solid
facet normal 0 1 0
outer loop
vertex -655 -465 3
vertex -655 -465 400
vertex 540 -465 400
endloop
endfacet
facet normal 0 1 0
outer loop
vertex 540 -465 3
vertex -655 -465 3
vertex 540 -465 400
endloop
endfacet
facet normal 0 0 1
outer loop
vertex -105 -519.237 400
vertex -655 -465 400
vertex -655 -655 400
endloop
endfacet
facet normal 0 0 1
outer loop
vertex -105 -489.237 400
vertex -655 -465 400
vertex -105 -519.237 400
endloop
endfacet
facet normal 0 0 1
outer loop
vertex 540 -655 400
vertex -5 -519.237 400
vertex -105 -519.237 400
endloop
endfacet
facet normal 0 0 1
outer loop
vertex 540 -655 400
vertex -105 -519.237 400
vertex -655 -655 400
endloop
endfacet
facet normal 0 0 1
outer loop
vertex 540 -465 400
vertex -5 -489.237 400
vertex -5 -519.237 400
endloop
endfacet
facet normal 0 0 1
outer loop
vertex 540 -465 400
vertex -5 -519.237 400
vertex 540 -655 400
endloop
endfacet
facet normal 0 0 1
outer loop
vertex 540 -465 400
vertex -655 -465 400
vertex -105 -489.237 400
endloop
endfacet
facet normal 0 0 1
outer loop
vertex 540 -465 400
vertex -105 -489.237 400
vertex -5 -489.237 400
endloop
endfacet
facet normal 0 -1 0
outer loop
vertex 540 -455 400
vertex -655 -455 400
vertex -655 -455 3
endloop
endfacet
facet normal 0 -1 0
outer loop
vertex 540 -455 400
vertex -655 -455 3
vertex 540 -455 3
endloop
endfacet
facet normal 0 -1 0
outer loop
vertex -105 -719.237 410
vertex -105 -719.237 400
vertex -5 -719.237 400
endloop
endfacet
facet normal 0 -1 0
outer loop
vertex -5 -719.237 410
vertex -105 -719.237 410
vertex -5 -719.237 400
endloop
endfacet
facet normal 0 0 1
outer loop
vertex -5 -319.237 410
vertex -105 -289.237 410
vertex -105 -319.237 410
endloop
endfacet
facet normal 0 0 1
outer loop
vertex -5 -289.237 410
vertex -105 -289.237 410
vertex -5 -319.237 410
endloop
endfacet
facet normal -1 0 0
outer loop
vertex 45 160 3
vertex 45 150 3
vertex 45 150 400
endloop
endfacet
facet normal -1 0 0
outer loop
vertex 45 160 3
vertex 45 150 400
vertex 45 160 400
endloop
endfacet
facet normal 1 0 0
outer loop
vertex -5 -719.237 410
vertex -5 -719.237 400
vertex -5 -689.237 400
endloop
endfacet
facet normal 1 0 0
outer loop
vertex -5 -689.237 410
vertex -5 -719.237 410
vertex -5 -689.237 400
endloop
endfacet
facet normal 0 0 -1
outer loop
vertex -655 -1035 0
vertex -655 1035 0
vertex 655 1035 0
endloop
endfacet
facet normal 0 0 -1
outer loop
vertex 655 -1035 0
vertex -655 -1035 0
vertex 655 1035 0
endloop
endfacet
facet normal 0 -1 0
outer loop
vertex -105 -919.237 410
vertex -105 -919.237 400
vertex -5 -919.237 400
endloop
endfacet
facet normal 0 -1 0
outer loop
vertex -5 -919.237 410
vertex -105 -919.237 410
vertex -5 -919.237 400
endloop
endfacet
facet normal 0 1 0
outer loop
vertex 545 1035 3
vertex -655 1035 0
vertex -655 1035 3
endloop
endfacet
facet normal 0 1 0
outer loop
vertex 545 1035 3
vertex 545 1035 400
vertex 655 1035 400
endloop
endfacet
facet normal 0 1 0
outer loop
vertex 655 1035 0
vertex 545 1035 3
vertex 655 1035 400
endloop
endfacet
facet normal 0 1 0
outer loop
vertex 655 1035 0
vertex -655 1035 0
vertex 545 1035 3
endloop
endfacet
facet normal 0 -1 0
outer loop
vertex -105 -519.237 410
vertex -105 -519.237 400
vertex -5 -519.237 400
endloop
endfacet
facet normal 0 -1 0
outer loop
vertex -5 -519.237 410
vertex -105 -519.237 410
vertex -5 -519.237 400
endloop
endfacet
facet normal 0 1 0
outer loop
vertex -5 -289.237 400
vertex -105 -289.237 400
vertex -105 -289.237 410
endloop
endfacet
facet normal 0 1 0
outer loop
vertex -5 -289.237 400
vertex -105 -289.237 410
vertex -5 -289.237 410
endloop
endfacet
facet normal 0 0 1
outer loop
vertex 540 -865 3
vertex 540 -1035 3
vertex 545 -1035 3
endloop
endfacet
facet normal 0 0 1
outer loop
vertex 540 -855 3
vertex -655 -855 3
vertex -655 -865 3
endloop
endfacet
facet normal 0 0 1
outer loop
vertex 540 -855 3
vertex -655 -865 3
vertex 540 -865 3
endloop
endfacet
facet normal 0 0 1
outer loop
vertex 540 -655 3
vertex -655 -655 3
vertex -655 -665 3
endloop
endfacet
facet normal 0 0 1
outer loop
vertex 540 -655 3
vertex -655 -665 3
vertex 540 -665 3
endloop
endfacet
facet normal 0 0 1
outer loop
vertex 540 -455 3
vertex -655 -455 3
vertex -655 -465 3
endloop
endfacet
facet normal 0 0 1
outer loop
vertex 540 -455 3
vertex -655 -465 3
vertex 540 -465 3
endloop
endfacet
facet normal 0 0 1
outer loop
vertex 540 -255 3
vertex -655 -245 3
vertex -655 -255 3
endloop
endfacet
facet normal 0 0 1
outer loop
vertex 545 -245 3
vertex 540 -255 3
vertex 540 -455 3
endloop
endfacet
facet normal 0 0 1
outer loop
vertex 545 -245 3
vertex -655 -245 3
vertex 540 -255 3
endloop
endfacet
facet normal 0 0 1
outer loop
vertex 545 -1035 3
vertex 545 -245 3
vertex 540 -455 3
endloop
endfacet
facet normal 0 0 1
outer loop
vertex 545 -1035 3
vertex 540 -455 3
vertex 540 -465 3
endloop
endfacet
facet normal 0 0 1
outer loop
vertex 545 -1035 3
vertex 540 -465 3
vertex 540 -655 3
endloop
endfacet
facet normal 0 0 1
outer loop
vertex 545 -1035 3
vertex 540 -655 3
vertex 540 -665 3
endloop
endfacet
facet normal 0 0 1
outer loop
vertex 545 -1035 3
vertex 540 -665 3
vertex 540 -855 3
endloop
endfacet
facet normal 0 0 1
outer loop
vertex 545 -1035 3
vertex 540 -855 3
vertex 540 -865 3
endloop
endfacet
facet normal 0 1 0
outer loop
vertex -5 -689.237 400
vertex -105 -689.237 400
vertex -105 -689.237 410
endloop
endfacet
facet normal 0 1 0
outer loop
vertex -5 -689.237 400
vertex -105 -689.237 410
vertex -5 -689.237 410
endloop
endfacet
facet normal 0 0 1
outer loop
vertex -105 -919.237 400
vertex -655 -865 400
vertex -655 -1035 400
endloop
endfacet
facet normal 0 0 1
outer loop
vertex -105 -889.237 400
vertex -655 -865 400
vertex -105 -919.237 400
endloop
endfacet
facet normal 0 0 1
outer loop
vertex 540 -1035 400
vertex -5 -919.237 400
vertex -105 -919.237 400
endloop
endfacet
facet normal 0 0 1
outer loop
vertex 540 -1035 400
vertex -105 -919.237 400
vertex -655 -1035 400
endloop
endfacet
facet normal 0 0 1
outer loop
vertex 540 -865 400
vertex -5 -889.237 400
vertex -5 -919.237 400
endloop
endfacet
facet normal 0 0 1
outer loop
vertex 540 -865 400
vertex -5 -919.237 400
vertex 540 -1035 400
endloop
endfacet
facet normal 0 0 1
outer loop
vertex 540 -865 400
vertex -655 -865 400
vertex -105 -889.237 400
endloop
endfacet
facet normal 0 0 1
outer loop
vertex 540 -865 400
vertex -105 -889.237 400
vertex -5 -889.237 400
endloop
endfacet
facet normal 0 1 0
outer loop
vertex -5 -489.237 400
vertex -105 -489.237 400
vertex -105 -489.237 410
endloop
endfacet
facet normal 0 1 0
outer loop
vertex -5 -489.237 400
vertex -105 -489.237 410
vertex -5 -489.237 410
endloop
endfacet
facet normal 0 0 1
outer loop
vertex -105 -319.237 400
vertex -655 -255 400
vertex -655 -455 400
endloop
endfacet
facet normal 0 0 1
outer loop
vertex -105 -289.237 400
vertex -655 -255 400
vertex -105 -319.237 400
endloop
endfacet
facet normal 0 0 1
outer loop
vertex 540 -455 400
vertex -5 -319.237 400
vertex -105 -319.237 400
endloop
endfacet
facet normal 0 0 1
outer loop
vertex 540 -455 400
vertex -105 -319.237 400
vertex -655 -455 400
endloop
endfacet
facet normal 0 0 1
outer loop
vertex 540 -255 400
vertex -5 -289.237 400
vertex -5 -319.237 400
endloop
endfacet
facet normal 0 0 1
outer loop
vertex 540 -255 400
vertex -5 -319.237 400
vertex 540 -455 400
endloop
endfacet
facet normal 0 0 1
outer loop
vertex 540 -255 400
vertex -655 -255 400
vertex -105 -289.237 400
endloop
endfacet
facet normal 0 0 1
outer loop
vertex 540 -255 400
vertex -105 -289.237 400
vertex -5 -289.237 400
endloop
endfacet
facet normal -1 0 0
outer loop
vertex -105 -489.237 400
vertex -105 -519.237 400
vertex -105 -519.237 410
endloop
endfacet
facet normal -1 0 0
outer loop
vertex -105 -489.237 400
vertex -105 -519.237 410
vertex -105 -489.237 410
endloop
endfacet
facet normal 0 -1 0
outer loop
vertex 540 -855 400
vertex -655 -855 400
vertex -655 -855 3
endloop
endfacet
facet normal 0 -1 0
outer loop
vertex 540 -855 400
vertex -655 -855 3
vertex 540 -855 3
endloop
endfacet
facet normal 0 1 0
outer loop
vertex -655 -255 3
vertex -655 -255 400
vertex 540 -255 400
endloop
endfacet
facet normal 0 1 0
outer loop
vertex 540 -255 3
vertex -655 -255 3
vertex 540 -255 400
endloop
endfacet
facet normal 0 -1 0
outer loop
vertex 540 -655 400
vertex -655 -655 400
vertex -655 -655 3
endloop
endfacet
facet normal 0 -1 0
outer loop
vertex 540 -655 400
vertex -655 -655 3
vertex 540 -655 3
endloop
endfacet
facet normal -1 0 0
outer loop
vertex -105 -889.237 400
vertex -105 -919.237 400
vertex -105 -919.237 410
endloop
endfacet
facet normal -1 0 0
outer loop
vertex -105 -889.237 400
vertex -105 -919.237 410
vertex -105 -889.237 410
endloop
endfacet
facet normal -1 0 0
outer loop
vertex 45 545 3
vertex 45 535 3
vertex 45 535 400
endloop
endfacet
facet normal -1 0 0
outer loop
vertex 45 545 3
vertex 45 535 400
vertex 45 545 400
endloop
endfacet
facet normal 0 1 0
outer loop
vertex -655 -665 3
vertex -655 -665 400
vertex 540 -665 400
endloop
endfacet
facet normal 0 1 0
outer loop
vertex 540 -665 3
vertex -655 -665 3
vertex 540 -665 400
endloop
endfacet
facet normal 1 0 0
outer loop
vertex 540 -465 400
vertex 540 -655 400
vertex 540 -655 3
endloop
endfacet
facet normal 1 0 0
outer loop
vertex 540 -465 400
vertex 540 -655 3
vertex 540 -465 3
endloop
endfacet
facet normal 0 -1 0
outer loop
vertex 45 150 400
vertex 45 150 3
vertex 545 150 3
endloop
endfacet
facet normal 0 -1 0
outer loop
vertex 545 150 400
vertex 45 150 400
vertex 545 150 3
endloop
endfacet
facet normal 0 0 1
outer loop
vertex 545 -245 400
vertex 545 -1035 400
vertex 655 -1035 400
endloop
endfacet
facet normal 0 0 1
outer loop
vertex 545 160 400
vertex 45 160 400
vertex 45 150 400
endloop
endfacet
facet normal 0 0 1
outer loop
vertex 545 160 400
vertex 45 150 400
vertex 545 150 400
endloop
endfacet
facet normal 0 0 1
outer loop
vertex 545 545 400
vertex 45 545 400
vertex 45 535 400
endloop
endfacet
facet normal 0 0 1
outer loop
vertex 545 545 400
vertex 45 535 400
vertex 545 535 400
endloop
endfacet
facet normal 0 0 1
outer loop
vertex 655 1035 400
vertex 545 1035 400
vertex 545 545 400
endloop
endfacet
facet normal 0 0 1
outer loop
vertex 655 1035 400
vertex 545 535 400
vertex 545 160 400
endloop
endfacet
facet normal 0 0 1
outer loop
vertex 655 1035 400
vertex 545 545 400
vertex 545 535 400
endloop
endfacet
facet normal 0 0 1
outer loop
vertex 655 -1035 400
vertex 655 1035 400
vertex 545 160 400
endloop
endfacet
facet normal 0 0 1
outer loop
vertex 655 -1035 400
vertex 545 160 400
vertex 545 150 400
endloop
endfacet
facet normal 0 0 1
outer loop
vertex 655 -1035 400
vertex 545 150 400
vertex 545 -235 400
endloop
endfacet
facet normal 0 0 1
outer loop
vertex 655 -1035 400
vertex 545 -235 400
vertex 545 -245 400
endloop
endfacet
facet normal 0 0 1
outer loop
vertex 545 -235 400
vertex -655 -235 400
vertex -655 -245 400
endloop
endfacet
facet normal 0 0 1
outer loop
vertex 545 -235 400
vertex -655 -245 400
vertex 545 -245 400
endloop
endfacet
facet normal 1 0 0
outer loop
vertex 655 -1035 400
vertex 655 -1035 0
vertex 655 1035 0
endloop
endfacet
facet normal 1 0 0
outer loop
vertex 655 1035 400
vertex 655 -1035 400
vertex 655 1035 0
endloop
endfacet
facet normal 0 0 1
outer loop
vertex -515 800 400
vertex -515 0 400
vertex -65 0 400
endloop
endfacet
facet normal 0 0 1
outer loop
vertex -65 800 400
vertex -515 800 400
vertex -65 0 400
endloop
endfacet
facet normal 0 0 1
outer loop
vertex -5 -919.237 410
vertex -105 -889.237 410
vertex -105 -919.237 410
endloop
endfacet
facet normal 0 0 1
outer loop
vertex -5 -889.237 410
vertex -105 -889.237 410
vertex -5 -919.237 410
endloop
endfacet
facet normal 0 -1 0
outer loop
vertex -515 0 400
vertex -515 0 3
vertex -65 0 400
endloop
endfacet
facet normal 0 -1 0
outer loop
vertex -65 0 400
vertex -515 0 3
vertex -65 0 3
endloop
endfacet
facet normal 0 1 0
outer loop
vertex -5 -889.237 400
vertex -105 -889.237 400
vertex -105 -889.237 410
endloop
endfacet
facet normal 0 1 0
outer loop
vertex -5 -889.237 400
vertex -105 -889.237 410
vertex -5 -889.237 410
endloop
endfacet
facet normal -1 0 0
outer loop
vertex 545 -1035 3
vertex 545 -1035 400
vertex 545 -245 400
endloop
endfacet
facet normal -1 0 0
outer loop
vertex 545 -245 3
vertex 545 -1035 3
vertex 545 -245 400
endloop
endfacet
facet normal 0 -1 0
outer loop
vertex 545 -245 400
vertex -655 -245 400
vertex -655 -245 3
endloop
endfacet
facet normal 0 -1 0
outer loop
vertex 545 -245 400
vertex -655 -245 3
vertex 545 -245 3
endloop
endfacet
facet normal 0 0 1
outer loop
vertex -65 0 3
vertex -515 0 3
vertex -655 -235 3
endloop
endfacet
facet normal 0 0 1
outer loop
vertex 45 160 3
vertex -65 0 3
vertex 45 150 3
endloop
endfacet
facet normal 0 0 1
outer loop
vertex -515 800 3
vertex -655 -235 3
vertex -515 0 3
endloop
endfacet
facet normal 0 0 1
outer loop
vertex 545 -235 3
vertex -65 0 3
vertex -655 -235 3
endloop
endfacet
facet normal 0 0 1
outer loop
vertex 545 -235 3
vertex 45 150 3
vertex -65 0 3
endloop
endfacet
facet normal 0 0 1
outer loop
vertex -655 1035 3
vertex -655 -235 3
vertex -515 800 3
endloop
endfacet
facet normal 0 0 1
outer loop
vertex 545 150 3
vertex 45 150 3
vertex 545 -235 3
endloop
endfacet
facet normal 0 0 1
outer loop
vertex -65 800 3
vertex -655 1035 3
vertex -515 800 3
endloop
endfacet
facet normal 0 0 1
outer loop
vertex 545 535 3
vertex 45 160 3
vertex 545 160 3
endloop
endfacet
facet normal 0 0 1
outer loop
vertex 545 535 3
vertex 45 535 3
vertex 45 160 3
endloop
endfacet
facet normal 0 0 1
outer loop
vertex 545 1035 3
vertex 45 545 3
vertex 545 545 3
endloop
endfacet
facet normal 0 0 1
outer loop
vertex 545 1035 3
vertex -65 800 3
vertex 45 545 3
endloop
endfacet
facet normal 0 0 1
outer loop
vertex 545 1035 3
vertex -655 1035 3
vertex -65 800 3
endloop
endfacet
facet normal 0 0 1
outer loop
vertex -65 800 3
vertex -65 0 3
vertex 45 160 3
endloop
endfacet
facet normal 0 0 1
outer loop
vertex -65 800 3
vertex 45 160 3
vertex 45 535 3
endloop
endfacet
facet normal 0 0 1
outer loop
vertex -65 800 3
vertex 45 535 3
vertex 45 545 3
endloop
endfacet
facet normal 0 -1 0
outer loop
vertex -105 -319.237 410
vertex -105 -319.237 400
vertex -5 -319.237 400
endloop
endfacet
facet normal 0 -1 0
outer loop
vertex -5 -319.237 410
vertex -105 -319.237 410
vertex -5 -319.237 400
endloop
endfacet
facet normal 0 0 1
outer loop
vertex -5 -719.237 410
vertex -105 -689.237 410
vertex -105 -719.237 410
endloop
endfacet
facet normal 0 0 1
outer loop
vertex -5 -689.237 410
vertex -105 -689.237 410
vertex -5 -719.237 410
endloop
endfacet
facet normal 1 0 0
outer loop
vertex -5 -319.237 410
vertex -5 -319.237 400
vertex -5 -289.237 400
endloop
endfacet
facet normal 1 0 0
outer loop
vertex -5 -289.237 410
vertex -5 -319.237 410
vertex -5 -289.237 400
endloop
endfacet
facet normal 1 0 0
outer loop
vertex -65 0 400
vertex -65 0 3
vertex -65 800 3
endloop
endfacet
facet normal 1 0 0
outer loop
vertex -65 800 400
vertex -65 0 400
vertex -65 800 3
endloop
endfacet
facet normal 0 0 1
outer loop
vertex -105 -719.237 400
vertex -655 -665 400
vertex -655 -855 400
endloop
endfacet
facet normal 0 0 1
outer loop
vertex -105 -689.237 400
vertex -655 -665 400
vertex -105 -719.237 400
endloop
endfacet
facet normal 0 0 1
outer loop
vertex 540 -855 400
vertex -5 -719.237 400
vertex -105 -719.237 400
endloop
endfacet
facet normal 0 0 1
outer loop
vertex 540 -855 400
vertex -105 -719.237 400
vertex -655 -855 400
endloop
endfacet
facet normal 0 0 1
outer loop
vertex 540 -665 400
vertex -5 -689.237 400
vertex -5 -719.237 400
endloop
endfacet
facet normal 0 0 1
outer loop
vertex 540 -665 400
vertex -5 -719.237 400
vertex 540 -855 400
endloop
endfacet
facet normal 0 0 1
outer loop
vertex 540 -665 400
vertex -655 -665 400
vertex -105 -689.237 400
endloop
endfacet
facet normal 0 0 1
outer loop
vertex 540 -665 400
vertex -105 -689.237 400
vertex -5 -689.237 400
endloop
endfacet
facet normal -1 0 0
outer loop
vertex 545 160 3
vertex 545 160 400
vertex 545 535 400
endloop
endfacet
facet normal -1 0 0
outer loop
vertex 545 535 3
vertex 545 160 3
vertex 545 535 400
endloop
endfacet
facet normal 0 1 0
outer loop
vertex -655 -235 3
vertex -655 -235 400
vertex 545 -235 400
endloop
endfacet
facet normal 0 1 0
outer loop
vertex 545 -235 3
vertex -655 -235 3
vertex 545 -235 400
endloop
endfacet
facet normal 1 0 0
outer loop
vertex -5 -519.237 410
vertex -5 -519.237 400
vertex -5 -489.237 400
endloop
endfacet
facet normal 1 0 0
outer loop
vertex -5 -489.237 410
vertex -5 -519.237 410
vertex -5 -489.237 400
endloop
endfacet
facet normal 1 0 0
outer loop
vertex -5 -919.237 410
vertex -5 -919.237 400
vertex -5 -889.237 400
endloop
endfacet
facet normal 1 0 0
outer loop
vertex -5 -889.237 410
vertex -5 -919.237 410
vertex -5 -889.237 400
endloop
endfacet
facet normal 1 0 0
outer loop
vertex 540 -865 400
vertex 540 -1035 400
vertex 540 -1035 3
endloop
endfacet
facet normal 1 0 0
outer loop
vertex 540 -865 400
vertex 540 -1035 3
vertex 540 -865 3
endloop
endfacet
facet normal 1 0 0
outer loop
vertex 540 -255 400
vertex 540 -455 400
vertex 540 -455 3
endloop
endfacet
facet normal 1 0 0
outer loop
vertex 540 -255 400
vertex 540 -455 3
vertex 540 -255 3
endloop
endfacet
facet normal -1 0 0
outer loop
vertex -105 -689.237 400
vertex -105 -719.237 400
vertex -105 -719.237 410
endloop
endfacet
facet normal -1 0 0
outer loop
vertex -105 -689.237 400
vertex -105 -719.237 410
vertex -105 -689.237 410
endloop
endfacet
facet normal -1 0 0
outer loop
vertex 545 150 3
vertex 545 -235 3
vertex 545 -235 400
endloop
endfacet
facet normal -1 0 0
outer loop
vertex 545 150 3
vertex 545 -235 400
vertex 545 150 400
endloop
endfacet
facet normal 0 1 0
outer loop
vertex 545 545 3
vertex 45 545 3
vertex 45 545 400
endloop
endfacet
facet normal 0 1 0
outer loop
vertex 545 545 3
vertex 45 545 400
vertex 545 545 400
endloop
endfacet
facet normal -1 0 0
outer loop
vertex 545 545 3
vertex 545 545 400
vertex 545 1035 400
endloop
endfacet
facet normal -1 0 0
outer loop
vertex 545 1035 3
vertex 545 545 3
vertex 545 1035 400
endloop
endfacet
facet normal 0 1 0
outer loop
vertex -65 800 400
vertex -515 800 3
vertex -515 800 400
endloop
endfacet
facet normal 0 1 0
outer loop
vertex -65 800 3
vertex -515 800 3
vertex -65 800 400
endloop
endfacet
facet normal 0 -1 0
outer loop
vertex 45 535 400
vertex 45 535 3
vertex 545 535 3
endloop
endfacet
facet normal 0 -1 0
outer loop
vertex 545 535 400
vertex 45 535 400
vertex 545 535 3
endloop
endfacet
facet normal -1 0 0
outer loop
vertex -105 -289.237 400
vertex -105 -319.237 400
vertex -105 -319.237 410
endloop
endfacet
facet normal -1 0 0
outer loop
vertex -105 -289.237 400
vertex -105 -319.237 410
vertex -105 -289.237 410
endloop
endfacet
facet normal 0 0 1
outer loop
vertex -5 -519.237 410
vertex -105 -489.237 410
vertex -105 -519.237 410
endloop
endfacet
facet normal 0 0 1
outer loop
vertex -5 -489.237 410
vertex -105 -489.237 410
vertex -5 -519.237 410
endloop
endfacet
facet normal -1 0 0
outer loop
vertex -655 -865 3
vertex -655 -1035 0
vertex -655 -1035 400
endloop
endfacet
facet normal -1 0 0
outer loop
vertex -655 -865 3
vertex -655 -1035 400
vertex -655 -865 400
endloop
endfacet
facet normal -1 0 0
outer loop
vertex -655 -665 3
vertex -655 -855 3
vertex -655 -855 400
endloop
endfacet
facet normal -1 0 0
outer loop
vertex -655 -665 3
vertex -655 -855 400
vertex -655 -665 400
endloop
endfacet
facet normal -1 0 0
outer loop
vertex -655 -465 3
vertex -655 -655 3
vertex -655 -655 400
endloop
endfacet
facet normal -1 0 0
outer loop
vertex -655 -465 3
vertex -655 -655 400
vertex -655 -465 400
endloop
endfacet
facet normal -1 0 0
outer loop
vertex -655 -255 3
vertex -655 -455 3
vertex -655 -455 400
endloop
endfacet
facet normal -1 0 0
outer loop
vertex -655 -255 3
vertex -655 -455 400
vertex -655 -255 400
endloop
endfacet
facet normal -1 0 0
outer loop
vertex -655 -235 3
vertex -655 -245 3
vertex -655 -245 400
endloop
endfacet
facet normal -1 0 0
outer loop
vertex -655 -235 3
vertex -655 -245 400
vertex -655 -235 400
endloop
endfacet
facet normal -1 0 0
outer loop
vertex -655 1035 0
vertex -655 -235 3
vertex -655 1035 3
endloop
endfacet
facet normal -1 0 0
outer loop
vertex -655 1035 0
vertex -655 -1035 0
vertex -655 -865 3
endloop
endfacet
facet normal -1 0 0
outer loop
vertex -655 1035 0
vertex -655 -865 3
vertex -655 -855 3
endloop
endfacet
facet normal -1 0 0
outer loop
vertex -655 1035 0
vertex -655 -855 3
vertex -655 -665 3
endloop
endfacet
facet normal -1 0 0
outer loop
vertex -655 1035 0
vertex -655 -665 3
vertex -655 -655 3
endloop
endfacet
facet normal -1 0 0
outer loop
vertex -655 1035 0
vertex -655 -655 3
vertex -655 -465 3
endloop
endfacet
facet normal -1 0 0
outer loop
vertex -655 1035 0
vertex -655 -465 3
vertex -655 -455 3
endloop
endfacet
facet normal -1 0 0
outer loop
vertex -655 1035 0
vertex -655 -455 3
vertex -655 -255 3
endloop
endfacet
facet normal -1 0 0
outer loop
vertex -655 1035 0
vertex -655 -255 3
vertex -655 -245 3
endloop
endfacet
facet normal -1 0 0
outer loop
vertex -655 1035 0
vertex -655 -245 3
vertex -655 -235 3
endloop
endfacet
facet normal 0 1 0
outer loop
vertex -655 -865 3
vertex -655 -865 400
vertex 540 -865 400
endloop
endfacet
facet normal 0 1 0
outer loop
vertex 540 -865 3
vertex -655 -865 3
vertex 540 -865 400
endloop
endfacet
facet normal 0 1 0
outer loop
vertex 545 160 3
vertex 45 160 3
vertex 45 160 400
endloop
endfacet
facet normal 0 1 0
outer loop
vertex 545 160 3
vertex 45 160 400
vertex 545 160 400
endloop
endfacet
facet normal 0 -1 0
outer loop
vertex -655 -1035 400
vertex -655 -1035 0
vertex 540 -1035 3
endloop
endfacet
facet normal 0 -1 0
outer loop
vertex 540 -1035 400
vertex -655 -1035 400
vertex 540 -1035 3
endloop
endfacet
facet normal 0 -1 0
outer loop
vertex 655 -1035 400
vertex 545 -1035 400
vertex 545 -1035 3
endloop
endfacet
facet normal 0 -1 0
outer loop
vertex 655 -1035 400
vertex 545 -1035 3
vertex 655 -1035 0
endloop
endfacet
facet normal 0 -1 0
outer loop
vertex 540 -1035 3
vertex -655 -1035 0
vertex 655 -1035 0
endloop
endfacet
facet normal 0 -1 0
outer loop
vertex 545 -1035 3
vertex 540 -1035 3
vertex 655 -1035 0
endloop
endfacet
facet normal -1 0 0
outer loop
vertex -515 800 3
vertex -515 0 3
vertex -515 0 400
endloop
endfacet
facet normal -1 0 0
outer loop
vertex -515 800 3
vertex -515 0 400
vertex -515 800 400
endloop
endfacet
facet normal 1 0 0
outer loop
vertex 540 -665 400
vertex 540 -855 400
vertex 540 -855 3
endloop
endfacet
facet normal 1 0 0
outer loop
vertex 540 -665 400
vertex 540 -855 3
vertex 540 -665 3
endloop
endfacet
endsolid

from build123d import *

# Parameters (mm, degrees)
SKETCH1_W           = 1310
SKETCH1_H           = 2070
BOSS_EXTRUDE1_DEPTH = 400
SKETCH2_W           = 1200
SKETCH2_H           = 400
CUT_EXTRUDE2_DEPTH  = 397
SKETCH5_W           = 1200
SKETCH5_H           = 10
CUT_EXTRUDE5_DEPTH  = 397
SKETCH6_W           = 1200
SKETCH6_H           = 10
CUT_EXTRUDE6_DEPTH  = 397
LPATTERN2_COUNT     = 3
LPATTERN2_PITCH     = 200
SKETCH9_W           = 100
SKETCH9_H           = 30
BOSS_EXTRUDE2_DEPTH = 10
LPATTERN3_COUNT     = 4
LPATTERN3_PITCH     = 200
SKETCH11_W          = 110
SKETCH11_H          = 2070
BOSS_EXTRUDE3_DEPTH = 400
SKETCH12_W          = 500
SKETCH12_H          = 10
CUT_EXTRUDE9_DEPTH  = 397
SKETCH13_W          = 1200
SKETCH13_H          = 870
CUT_EXTRUDE10_DEPTH = 397
SKETCH14_W          = 500
SKETCH14_H          = 10
BOSS_EXTRUDE4_DEPTH = 397
LPATTERN4_COUNT     = 2
LPATTERN4_PITCH     = 385
SKETCH16_W          = 5
SKETCH16_H          = 780
CUT_EXTRUDE11_DEPTH = 397
SKETCH17_W          = 450
SKETCH17_H          = 800
BOSS_EXTRUDE5_DEPTH = 397


with BuildPart() as part:
    # Sketch1 → Boss-Extrude1 (new body)
    with BuildSketch(Plane.XY):
        Rectangle(SKETCH1_W, SKETCH1_H)
    extrude(amount=BOSS_EXTRUDE1_DEPTH)

    # Sketch2 → Cut-Extrude2 (cut)
    with BuildSketch(Plane.XY.offset(400)):
        with Locations((-55, -35)):
            Rectangle(SKETCH2_W, SKETCH2_H)
    extrude(amount=-CUT_EXTRUDE2_DEPTH, mode=Mode.SUBTRACT)

    # Sketch5 → Cut-Extrude5 (cut)
    with BuildSketch(Plane.XY.offset(400)):
        with Locations((-55, -250)):
            Rectangle(SKETCH5_W, SKETCH5_H)
    extrude(amount=-CUT_EXTRUDE5_DEPTH, mode=Mode.SUBTRACT)

    # Sketch6 → Cut-Extrude6 (cut)
    with BuildSketch(Plane.XY.offset(400)):
        with Locations((-55, -460)):
            Rectangle(SKETCH6_W, SKETCH6_H)
    cut_extrude6 = extrude(amount=-CUT_EXTRUDE6_DEPTH, mode=Mode.SUBTRACT)

    # LPattern2: Cut-Extrude6 ×3
    with Locations(*[(0, -i * LPATTERN2_PITCH, 0) for i in range(1, LPATTERN2_COUNT)]):
        add(cut_extrude6, mode=Mode.SUBTRACT)

    # Sketch9 → Boss-Extrude2 (add)
    with BuildSketch(Plane.XY.offset(400)):
        with Locations((-55, -304.237135846)):
            Rectangle(SKETCH9_W, SKETCH9_H)
    boss_extrude2 = extrude(amount=BOSS_EXTRUDE2_DEPTH)

    # LPattern3: Boss-Extrude2 ×4
    with Locations(*[(0, -i * LPATTERN3_PITCH, 0) for i in range(1, LPATTERN3_COUNT)]):
        add(boss_extrude2)

    # Sketch12 → Cut-Extrude9 (cut)
    with BuildSketch(Plane.XY.offset(400)):
        with Locations((295, 670)):
            Rectangle(SKETCH12_W, SKETCH12_H)
    extrude(amount=-CUT_EXTRUDE9_DEPTH, mode=Mode.SUBTRACT)

    # Sketch13 → Cut-Extrude10 (cut)
    with BuildSketch(Plane.XY.offset(400)):
        with Locations((-55, 600)):
            Rectangle(SKETCH13_W, SKETCH13_H)
    extrude(amount=-CUT_EXTRUDE10_DEPTH, mode=Mode.SUBTRACT)



with BuildPart() as body_2:
    # Sketch11 → Boss-Extrude3 (new body)
    with BuildSketch(Plane.XY.offset(400)):
        with Locations((600, 0)):
            Rectangle(SKETCH11_W, SKETCH11_H)
    extrude(amount=-BOSS_EXTRUDE3_DEPTH)


with BuildPart() as part_1:
    add(part.part)

    add(body_2.part)  # Boss-Extrude4 merges body 2
    # Sketch14 → Boss-Extrude4 (add)
    with BuildSketch(Plane.XY.offset(3)):
        with Locations((295, 155)):
            Rectangle(SKETCH14_W, SKETCH14_H)
    boss_extrude4 = extrude(amount=BOSS_EXTRUDE4_DEPTH)

    # LPattern4: Boss-Extrude4 ×2
    with Locations(*[(0, i * LPATTERN4_PITCH, 0) for i in range(1, LPATTERN4_COUNT)]):
        add(boss_extrude4)

    # Sketch16 → Cut-Extrude11 (cut)
    with BuildSketch(Plane.XY.offset(400)):
        with Locations((542.5, -645)):
            Rectangle(SKETCH16_W, SKETCH16_H)
    extrude(amount=-CUT_EXTRUDE11_DEPTH, mode=Mode.SUBTRACT)

    # Sketch17 → Boss-Extrude5 (add)
    with BuildSketch(Plane.XY.offset(3)):
        with Locations((-290, 400)):
            Rectangle(SKETCH17_W, SKETCH17_H)
    extrude(amount=BOSS_EXTRUDE5_DEPTH)


solid = part_1.part
